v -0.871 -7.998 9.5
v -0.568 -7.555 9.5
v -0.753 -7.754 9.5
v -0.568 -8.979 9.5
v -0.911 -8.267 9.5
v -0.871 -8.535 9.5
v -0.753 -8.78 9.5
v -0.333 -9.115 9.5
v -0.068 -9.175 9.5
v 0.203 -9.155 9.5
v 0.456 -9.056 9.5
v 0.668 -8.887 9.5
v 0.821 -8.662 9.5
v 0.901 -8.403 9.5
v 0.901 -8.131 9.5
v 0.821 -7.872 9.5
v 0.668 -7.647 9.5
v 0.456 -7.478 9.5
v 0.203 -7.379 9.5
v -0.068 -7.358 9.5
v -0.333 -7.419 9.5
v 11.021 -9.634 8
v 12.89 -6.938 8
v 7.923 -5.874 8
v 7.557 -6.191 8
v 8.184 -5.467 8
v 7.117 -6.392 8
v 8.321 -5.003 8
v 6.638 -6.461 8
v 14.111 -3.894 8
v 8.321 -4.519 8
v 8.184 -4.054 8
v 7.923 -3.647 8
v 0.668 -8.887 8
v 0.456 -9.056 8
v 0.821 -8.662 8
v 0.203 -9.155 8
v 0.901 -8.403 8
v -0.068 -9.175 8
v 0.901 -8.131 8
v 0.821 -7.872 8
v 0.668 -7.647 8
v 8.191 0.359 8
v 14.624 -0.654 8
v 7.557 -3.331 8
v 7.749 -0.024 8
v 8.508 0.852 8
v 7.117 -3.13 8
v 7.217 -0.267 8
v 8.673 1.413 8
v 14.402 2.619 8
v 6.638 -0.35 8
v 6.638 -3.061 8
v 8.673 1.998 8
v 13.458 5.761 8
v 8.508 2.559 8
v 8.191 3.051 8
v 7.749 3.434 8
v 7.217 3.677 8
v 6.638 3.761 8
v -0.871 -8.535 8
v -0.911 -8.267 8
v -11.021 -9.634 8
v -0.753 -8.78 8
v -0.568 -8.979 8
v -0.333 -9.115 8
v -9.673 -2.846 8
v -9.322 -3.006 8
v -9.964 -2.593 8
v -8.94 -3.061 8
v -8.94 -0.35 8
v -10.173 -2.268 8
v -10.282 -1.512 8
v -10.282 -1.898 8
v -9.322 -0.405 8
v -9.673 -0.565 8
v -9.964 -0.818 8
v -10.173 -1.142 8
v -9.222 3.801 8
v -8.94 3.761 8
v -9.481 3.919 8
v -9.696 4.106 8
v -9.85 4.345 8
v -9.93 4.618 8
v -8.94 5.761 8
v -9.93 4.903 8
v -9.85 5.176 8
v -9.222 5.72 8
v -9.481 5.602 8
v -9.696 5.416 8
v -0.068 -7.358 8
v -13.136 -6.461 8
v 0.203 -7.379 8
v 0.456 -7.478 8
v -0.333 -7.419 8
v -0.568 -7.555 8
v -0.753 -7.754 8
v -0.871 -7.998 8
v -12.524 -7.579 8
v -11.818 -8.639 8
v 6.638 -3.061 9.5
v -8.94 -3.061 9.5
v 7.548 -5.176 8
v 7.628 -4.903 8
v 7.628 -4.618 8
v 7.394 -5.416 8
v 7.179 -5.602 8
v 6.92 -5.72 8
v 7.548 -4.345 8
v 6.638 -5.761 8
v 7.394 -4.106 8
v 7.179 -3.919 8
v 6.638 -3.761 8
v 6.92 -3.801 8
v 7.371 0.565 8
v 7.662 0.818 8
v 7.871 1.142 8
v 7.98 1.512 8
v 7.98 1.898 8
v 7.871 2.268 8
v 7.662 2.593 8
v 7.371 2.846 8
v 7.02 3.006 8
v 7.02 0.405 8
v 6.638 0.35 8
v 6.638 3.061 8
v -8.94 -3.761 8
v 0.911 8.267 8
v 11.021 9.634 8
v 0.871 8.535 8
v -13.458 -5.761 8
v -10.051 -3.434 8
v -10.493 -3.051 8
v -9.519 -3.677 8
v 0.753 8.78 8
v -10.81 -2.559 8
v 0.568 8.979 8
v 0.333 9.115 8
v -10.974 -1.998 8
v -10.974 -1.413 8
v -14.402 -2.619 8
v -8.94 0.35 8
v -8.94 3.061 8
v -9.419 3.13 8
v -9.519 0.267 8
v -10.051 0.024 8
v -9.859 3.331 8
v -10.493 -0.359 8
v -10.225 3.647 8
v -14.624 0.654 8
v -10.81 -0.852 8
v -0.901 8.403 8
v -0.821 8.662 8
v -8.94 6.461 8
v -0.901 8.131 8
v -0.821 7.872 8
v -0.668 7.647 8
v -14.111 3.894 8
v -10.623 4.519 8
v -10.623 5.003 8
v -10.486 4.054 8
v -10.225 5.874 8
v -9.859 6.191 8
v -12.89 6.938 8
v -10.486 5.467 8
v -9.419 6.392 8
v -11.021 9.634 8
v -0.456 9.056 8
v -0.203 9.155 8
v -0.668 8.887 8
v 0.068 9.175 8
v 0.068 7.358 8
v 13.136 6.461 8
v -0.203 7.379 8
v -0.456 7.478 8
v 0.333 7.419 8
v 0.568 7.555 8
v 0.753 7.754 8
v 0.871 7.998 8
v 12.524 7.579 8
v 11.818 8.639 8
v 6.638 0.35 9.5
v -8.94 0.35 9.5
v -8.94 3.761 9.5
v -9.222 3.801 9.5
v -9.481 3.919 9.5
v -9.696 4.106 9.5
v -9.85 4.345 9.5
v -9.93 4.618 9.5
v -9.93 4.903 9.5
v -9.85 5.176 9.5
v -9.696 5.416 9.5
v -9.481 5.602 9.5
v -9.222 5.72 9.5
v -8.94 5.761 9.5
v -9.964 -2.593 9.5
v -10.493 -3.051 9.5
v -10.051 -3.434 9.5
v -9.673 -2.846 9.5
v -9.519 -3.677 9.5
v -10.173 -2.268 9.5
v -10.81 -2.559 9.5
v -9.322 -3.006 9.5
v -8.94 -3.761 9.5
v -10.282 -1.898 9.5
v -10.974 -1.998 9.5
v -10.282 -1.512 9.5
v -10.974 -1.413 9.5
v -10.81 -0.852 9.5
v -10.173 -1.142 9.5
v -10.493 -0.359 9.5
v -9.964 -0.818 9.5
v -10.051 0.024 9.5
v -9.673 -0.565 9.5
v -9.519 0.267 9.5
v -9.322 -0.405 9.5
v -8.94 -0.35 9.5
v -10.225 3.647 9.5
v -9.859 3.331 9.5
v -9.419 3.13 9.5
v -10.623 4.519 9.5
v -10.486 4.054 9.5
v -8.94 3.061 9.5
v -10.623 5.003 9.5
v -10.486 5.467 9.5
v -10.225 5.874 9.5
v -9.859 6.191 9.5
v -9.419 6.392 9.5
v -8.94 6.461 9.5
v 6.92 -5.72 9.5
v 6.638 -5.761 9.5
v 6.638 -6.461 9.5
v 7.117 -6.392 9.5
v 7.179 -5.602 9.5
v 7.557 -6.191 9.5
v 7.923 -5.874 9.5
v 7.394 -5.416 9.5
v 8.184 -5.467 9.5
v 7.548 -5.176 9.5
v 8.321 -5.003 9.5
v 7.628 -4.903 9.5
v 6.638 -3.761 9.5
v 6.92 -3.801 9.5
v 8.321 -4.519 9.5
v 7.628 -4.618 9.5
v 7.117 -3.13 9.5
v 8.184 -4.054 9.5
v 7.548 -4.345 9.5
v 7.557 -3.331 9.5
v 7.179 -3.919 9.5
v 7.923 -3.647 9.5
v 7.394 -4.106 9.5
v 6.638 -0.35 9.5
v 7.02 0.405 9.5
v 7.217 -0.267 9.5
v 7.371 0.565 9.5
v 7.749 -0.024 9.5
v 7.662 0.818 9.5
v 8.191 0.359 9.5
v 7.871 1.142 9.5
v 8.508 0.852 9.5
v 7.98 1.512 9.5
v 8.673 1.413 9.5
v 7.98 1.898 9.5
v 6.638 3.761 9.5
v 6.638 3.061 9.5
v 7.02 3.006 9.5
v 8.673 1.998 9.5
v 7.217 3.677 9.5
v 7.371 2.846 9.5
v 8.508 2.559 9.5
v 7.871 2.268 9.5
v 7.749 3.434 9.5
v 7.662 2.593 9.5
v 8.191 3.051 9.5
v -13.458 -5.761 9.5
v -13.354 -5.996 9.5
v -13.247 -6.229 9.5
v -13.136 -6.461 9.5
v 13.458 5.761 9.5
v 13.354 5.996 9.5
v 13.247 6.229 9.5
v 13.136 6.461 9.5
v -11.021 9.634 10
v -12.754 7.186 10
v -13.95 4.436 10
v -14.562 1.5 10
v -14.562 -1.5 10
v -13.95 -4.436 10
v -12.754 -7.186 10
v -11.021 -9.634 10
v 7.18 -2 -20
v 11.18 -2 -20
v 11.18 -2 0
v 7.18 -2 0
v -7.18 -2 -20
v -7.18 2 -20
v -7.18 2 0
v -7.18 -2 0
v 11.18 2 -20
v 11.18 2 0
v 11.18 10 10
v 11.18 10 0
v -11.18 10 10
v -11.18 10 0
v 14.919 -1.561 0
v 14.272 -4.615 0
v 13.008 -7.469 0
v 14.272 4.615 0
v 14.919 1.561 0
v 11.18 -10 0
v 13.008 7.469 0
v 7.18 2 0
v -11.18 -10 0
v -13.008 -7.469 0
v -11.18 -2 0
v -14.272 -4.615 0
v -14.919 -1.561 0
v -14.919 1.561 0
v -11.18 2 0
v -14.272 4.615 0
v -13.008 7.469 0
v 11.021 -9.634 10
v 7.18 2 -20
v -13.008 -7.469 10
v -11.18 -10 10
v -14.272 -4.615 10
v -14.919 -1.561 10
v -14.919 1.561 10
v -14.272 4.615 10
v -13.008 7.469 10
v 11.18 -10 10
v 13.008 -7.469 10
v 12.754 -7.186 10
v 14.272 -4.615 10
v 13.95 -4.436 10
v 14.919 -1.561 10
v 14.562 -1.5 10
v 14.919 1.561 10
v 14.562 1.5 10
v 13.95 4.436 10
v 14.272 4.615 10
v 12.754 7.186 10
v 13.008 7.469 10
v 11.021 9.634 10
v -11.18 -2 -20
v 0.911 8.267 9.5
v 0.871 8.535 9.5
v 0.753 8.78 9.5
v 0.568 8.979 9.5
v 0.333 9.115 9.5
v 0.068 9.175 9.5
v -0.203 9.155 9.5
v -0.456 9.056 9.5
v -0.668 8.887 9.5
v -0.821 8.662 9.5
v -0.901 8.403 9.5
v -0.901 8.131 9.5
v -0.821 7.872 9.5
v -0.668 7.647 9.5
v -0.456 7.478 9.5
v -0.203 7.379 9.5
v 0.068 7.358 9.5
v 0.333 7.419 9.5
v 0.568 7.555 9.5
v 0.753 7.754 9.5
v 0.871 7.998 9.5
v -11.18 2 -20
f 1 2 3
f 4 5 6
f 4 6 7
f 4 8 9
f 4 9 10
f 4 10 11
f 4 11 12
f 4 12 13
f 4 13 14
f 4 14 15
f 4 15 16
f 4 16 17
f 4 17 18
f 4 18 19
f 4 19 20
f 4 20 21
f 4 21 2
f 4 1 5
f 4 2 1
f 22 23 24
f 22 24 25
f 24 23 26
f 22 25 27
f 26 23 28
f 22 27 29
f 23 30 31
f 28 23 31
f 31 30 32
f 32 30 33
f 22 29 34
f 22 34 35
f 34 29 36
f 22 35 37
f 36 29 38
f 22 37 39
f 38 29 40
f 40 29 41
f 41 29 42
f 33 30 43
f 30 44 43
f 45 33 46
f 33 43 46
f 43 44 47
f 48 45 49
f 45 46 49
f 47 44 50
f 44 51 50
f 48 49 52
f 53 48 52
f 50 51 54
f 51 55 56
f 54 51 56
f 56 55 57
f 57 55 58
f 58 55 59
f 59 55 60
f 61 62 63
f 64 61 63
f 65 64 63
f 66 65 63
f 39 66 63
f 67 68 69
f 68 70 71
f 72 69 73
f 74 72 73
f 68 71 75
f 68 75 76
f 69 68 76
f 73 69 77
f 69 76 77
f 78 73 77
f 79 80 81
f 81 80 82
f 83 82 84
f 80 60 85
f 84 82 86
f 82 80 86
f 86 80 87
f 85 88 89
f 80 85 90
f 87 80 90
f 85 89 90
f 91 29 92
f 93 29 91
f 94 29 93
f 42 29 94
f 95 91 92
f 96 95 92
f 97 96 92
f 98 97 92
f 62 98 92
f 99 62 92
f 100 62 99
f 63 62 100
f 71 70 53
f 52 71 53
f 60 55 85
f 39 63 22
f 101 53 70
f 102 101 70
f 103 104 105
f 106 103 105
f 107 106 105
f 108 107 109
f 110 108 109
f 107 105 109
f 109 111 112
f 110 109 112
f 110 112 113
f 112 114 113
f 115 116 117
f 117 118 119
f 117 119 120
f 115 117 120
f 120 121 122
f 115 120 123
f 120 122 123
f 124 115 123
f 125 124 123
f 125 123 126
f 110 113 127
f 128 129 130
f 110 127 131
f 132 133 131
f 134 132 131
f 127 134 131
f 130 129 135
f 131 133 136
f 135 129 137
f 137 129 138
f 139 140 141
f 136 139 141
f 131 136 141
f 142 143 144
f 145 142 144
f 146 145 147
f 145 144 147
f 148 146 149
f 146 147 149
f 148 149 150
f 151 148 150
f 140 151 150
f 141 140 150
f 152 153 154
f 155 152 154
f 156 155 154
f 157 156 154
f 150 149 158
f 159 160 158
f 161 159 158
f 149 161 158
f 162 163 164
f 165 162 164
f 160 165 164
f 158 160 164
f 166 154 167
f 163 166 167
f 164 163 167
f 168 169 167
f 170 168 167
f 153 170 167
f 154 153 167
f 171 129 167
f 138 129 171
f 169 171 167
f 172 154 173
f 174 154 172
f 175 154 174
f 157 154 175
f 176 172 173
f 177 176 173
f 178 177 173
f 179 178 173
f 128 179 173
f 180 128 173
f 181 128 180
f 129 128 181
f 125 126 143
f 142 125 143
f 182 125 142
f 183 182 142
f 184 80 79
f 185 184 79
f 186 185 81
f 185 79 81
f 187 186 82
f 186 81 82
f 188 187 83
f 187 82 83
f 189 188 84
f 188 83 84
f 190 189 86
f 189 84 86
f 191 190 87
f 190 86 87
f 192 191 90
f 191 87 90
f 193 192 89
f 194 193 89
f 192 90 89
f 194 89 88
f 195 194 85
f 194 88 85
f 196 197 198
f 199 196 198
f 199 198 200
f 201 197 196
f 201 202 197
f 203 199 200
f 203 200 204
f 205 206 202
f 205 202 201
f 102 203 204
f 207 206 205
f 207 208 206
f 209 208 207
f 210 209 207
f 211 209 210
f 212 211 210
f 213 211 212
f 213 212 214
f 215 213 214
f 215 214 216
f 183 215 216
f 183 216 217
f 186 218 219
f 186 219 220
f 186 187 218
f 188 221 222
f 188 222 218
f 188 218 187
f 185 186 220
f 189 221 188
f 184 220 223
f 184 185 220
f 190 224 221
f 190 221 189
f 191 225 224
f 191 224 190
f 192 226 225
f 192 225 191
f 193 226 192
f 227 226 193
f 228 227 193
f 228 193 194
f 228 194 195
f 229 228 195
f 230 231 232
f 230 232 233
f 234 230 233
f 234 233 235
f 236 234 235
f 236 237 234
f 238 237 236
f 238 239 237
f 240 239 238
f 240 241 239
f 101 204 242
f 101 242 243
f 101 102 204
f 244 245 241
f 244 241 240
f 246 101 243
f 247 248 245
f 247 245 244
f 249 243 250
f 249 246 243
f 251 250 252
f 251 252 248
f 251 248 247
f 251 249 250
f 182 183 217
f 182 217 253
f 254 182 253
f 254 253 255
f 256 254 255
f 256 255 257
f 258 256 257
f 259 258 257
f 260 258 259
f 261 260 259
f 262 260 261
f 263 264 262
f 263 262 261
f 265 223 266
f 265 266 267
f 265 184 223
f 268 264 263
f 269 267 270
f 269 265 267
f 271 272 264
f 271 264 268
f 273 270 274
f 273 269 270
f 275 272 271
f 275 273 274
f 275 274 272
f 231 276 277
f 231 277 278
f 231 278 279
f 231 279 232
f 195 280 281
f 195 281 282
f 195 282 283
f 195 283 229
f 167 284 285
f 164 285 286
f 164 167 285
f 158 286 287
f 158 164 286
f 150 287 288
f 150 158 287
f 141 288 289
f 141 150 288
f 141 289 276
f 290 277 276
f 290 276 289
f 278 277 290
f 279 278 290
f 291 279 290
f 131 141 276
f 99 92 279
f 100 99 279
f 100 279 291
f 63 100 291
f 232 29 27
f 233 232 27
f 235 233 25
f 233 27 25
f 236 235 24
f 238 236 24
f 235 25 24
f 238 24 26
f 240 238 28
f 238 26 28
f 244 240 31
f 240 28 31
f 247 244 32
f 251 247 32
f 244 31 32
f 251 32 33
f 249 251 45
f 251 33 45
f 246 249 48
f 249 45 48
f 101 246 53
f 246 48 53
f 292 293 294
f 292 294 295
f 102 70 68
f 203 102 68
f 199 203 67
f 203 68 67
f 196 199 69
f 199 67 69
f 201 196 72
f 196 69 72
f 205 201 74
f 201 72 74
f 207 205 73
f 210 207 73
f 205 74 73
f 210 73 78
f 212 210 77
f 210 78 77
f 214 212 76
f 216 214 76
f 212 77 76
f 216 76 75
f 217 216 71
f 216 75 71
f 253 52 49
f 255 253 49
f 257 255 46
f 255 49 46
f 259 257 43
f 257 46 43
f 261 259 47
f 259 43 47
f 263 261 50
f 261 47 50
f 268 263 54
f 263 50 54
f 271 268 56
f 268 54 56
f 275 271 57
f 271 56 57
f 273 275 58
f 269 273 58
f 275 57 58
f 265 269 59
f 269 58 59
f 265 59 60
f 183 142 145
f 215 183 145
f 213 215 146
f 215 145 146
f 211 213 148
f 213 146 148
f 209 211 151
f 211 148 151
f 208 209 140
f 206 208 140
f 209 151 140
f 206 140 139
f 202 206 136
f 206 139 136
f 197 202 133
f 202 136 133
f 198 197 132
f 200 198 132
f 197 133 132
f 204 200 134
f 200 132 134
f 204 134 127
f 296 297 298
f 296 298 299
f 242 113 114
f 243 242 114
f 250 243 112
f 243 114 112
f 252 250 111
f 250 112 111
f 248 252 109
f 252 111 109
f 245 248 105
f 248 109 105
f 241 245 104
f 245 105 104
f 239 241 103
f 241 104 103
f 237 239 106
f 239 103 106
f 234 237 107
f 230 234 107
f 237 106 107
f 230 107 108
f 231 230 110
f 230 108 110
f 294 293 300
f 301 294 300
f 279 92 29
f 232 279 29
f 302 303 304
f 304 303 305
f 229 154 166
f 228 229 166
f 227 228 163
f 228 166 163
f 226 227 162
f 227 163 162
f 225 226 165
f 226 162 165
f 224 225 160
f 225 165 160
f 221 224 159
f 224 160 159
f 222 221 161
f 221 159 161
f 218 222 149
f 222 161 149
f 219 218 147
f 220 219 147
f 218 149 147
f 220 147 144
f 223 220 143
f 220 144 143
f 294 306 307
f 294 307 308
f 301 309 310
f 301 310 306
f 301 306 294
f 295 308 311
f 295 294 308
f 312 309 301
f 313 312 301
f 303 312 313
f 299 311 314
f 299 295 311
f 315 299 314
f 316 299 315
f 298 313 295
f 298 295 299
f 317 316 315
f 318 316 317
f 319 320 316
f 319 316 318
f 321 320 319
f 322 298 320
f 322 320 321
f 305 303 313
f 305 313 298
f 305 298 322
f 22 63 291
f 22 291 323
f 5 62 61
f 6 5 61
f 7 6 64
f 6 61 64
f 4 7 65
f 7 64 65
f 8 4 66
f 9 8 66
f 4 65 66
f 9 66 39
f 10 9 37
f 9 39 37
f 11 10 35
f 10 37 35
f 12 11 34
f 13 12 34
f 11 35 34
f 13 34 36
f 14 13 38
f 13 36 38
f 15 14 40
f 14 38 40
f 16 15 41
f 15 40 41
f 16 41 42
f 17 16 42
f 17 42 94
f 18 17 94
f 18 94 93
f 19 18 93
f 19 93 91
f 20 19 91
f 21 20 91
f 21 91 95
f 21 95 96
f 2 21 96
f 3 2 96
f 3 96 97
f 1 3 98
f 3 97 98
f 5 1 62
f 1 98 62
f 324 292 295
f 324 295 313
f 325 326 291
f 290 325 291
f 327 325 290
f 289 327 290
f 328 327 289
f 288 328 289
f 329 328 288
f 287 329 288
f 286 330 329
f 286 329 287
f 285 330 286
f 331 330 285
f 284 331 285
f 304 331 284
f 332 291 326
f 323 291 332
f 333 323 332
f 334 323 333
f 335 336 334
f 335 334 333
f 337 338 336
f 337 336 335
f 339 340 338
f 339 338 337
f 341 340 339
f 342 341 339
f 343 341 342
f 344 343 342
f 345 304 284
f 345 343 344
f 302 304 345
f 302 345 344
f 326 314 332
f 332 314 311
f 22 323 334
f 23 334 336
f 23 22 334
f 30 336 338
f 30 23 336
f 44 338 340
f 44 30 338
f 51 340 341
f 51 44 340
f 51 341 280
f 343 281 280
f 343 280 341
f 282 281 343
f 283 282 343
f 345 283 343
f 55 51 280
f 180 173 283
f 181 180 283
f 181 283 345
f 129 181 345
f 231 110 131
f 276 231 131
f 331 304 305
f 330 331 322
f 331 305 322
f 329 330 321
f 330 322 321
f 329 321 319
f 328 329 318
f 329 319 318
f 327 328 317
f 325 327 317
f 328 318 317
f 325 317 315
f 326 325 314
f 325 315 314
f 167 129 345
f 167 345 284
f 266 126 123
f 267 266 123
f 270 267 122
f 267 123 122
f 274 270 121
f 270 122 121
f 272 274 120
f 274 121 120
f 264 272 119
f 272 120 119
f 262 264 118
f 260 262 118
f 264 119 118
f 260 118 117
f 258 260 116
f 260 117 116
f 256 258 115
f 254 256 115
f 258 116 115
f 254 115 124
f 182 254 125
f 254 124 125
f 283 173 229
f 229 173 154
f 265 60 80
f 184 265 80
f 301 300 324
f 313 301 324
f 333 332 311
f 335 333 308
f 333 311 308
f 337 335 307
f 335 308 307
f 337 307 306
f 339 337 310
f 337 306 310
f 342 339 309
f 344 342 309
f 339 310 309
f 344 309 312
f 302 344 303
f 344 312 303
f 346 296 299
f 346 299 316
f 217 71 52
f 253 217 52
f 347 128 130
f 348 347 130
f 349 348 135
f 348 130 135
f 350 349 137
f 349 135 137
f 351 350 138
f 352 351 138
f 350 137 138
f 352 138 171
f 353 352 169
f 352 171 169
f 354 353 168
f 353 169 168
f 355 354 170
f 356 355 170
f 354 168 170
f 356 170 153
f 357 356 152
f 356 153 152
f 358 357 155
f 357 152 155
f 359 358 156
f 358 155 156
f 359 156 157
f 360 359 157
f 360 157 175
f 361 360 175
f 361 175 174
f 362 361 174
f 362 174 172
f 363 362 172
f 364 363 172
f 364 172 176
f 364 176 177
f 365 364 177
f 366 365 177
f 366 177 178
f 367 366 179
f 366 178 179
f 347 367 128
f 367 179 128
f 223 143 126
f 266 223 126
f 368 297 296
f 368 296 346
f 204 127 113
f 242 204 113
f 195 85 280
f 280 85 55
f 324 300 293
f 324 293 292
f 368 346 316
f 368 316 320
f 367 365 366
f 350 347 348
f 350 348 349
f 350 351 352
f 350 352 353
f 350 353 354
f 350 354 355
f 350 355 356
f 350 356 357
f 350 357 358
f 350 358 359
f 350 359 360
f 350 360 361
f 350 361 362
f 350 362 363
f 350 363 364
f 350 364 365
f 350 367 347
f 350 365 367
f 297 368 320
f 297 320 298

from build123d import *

# Parameters (mm, degrees)
BOSS_EXTRUDE1_DEPTH = 8
SKETCH2_W           = 4
SKETCH2_H           = 4
BOSS_EXTRUDE2_DEPTH = 20
BOSS_EXTRUDE3_DEPTH = 2
SKETCH4_R           = 0.91109378
BOSS_EXTRUDE4_DEPTH = 1.5


with BuildPart() as part:
    # Sketch1 → Boss-Extrude1 (new body)
    with BuildSketch(Plane.XY):
        with BuildLine():
            Line((-11.180339887, 10), (11.180339887, 10))
            ThreePointArc((11.180339887, 10), (15, 0), (11.180339887, -10))
            Line((11.180339887, -10), (-11.180339887, -10))
            ThreePointArc((-11.180339887, -10), (-15, 0), (-11.180339887, 10))
        make_face()
    extrude(amount=BOSS_EXTRUDE1_DEPTH)

    # Sketch2 → Boss-Extrude2 (add)
    with BuildSketch(Plane(origin=(0, 0, 0), x_dir=(-1, 0, 0), z_dir=(0, 0, -1))):
        with Locations((-9.180339887, 0)):
            Rectangle(SKETCH2_W, SKETCH2_H)
        Polygon((7.180339887, 2), (7.180339887, -2), (11.180339887, -2), (11.180339887, 0), (11.180339887, 2), align=None)
    extrude(amount=BOSS_EXTRUDE2_DEPTH)

    # Sketch3 → Boss-Extrude3 (add)
    with BuildSketch(Plane.XY.offset(8)):
        with BuildLine():
            Line((-11.180339887, -10), (11.180339887, -10))
            ThreePointArc((11.180339887, -10), (15, 0), (11.180339887, 10))
            Line((11.180339887, 10), (-11.180339887, 10))
            ThreePointArc((-11.180339887, 10), (-15, 0), (-11.180339887, -10))
        make_face()
        with BuildLine():
            ThreePointArc((-11.021413403, 9.634230221), (-14.638645612, 0), (-11.021413403, -9.634230221))
            Line((-11.021413403, -9.634230221), (11.021413403, -9.634230221))
            ThreePointArc((11.021413403, -9.634230221), (14.638645612, 0), (11.021413403, 9.634230221))
            Line((11.021413403, 9.634230221), (-11.021413403, 9.634230221))
        make_face(mode=Mode.SUBTRACT)
    extrude(amount=BOSS_EXTRUDE3_DEPTH)

    # Sketch4 → Boss-Extrude4 (add)
    with BuildSketch(Plane.XY.offset(8)):
        with Locations((0, 8.266858506)):
            Circle(SKETCH4_R)
        with Locations(Location((0, -8.266858506, 0), (0, 0, 180))):
            Circle(SKETCH4_R)
        with BuildLine():
            Line((13.1358141, 6.460675915), (-8.940009027, 6.460675915))
            ThreePointArc((-8.940009027, 6.460675915), (-10.640009027, 4.760675915), (-8.940009027, 3.060675915))
            Line((-8.940009027, 3.060675915), (6.638090535, 3.060675915))
            ThreePointArc((6.638090535, 3.060675915), (7.993428493, 1.705337957), (6.638090535, 0.35))
            Line((6.638090535, 0.35), (-8.940009027, 0.35))
            ThreePointArc((-8.940009027, 0.35), (-10.995346985, -1.705337957), (-8.940009027, -3.760675915))
            Line((-8.940009027, -3.760675915), (6.638090535, -3.760675915))
            ThreePointArc((6.638090535, -3.760675915), (7.638090535, -4.760675915), (6.638090535, -5.760675915))
            Line((6.638090535, -5.760675915), (-8.940009027, -5.760675915))
            Line((-8.940009027, -5.760675915), (-13.457509367, -5.760675915))
            ThreePointArc((-13.457509367, -5.760675915), (-13.301267355, -6.112792496), (-13.1358141, -6.460675915))
            Line((-13.1358141, -6.460675915), (-8.940009027, -6.460675915))
            Line((-8.940009027, -6.460675915), (6.638090535, -6.460675915))
            ThreePointArc((6.638090535, -6.460675915), (8.338090535, -4.760675915), (6.638090535, -3.060675915))
            Line((6.638090535, -3.060675915), (-8.940009027, -3.060675915))
            ThreePointArc((-8.940009027, -3.060675915), (-10.295346985, -1.705337957), (-8.940009027, -0.35))
            Line((-8.940009027, -0.35), (6.638090535, -0.35))
            ThreePointArc((6.638090535, -0.35), (8.693428493, 1.705337957), (6.638090535, 3.760675915))
            Line((6.638090535, 3.760675915), (-8.940009027, 3.760675915))
            ThreePointArc((-8.940009027, 3.760675915), (-9.940009027, 4.760675915), (-8.940009027, 5.760675915))
            Line((-8.940009027, 5.760675915), (13.457509367, 5.760675915))
            ThreePointArc((13.457509367, 5.760675915), (13.301267355, 6.112792496), (13.1358141, 6.460675915))
        make_face()
    extrude(amount=BOSS_EXTRUDE4_DEPTH)


solid = part.part
